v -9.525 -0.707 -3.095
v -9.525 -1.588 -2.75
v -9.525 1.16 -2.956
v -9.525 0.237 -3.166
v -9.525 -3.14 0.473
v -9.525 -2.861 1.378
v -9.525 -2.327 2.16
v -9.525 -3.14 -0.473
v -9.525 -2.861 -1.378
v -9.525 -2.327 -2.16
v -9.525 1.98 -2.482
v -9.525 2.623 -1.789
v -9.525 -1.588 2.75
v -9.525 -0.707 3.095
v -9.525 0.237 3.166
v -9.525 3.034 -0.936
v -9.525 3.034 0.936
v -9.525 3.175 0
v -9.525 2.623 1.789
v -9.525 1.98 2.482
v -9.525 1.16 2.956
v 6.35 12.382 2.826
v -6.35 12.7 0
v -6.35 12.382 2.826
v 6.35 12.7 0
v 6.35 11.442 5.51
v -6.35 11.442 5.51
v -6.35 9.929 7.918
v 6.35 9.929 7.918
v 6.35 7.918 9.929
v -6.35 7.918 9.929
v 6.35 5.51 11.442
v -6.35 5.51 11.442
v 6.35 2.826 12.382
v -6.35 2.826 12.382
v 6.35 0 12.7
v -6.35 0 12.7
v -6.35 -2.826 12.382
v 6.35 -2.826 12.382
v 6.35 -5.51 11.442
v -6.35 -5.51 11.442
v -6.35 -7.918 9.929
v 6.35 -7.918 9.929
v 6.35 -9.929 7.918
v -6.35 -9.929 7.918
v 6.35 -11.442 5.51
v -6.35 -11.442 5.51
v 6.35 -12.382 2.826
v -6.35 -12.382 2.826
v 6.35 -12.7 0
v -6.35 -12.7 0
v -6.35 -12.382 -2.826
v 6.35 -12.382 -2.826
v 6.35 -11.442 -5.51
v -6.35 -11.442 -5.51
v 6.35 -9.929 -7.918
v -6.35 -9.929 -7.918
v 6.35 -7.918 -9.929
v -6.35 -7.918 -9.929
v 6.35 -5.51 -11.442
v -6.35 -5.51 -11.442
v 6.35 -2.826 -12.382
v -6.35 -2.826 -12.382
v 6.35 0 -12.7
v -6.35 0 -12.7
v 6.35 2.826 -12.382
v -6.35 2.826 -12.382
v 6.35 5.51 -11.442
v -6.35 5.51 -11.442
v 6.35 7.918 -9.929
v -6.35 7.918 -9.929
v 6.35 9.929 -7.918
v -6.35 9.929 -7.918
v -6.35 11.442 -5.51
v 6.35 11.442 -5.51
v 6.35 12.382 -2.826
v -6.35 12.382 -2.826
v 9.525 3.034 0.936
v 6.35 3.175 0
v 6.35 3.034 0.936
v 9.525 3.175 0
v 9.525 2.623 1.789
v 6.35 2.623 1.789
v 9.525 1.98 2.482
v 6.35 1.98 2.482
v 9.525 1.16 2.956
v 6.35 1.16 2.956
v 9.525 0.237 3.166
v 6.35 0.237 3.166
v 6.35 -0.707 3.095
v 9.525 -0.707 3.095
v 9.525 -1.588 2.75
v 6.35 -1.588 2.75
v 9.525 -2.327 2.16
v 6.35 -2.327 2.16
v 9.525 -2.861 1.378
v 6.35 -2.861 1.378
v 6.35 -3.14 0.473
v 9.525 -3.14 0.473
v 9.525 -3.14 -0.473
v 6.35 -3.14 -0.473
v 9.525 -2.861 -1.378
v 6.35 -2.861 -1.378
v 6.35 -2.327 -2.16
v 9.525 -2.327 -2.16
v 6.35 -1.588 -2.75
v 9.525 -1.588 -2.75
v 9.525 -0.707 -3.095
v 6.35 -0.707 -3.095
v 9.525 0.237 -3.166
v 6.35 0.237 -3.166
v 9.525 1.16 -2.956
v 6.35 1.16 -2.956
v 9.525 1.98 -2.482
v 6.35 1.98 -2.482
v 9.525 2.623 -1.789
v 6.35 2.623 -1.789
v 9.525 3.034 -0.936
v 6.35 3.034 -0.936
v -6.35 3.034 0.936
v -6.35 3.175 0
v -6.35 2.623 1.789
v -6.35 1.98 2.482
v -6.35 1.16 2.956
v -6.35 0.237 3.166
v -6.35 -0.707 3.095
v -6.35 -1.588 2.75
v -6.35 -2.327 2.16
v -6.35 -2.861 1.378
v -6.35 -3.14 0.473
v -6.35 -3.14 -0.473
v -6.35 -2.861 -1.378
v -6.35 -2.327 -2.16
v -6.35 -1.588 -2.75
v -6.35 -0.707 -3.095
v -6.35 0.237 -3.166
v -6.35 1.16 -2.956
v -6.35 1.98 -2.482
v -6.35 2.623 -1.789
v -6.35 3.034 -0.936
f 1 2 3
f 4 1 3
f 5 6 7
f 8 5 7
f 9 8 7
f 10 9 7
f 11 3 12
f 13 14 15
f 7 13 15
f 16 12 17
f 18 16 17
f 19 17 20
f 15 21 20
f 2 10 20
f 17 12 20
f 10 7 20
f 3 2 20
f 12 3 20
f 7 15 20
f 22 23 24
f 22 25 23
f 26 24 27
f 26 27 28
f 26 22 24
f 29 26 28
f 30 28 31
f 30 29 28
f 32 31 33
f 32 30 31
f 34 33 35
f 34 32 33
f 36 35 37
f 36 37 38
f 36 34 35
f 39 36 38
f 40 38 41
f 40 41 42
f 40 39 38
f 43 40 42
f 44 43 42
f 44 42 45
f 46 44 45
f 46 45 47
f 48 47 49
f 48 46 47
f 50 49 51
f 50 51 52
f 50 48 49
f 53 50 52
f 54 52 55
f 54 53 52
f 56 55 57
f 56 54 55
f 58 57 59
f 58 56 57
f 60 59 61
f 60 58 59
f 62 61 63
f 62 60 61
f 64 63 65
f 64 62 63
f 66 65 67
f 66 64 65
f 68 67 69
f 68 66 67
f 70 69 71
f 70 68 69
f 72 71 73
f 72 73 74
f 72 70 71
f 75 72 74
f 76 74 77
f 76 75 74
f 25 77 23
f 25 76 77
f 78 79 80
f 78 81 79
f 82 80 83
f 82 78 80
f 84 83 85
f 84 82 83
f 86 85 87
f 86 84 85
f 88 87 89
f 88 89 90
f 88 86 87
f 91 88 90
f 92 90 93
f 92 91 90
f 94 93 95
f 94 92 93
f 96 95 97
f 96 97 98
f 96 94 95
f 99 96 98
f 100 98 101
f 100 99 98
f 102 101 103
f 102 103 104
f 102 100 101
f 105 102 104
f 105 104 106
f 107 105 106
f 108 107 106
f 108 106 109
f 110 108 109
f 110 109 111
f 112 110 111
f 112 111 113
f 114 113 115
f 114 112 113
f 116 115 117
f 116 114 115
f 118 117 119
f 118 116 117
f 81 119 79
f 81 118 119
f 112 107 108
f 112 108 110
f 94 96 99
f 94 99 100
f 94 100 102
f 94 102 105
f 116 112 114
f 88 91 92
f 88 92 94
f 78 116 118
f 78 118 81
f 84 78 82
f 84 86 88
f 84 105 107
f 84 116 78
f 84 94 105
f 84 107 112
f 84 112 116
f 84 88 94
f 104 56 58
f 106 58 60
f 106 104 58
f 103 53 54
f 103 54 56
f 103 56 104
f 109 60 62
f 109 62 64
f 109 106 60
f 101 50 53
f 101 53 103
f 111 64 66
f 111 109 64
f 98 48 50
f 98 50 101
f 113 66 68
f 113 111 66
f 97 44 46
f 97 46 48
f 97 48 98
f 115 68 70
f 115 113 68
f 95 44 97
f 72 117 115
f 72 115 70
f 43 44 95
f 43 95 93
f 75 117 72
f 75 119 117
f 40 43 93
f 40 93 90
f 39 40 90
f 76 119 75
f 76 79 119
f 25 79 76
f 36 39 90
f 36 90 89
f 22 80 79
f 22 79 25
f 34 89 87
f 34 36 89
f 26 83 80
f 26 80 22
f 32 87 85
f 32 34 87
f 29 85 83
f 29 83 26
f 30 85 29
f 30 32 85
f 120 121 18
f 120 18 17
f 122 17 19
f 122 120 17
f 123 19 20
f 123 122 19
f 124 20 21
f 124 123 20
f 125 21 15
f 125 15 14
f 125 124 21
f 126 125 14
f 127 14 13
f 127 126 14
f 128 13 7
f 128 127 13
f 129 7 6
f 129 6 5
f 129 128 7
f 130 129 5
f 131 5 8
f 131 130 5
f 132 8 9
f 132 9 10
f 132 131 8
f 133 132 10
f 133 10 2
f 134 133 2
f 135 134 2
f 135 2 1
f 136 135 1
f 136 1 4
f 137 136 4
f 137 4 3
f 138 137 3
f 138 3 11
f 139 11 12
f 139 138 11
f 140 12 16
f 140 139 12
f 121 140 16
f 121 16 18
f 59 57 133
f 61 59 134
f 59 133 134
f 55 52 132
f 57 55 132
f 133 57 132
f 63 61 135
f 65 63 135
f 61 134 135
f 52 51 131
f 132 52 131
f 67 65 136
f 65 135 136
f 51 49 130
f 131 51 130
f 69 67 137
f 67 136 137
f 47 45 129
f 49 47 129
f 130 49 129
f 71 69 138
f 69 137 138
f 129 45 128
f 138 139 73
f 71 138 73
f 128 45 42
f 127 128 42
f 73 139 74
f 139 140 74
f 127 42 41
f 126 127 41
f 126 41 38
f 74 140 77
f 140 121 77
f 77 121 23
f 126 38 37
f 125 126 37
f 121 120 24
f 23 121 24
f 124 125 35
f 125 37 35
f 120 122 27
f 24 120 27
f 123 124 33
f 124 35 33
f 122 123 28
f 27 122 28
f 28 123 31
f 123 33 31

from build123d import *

# Parameters (mm, degrees)
F0_R     = 3.175
F1_DEPTH = 9.525
F0_R_2   = 12.7
F2_DEPTH = 6.35


# Not quite as in the source:
# - a feature of the source that left no trace in its solid (it failed there, or was rolled back) is left out


with BuildPart() as f1:
    # F0 (on Right) → F1 (new body, symmetric)
    with BuildSketch(Plane.YZ):
        Circle(F0_R)
    extrude(amount=F1_DEPTH, both=True)

    # F0 (on Right) → F2 (join, symmetric)
    with BuildSketch(Plane.YZ):
        Circle(F0_R_2)
        Circle(F0_R, mode=Mode.SUBTRACT)
    extrude(amount=F2_DEPTH, both=True)


solid = f1.part
